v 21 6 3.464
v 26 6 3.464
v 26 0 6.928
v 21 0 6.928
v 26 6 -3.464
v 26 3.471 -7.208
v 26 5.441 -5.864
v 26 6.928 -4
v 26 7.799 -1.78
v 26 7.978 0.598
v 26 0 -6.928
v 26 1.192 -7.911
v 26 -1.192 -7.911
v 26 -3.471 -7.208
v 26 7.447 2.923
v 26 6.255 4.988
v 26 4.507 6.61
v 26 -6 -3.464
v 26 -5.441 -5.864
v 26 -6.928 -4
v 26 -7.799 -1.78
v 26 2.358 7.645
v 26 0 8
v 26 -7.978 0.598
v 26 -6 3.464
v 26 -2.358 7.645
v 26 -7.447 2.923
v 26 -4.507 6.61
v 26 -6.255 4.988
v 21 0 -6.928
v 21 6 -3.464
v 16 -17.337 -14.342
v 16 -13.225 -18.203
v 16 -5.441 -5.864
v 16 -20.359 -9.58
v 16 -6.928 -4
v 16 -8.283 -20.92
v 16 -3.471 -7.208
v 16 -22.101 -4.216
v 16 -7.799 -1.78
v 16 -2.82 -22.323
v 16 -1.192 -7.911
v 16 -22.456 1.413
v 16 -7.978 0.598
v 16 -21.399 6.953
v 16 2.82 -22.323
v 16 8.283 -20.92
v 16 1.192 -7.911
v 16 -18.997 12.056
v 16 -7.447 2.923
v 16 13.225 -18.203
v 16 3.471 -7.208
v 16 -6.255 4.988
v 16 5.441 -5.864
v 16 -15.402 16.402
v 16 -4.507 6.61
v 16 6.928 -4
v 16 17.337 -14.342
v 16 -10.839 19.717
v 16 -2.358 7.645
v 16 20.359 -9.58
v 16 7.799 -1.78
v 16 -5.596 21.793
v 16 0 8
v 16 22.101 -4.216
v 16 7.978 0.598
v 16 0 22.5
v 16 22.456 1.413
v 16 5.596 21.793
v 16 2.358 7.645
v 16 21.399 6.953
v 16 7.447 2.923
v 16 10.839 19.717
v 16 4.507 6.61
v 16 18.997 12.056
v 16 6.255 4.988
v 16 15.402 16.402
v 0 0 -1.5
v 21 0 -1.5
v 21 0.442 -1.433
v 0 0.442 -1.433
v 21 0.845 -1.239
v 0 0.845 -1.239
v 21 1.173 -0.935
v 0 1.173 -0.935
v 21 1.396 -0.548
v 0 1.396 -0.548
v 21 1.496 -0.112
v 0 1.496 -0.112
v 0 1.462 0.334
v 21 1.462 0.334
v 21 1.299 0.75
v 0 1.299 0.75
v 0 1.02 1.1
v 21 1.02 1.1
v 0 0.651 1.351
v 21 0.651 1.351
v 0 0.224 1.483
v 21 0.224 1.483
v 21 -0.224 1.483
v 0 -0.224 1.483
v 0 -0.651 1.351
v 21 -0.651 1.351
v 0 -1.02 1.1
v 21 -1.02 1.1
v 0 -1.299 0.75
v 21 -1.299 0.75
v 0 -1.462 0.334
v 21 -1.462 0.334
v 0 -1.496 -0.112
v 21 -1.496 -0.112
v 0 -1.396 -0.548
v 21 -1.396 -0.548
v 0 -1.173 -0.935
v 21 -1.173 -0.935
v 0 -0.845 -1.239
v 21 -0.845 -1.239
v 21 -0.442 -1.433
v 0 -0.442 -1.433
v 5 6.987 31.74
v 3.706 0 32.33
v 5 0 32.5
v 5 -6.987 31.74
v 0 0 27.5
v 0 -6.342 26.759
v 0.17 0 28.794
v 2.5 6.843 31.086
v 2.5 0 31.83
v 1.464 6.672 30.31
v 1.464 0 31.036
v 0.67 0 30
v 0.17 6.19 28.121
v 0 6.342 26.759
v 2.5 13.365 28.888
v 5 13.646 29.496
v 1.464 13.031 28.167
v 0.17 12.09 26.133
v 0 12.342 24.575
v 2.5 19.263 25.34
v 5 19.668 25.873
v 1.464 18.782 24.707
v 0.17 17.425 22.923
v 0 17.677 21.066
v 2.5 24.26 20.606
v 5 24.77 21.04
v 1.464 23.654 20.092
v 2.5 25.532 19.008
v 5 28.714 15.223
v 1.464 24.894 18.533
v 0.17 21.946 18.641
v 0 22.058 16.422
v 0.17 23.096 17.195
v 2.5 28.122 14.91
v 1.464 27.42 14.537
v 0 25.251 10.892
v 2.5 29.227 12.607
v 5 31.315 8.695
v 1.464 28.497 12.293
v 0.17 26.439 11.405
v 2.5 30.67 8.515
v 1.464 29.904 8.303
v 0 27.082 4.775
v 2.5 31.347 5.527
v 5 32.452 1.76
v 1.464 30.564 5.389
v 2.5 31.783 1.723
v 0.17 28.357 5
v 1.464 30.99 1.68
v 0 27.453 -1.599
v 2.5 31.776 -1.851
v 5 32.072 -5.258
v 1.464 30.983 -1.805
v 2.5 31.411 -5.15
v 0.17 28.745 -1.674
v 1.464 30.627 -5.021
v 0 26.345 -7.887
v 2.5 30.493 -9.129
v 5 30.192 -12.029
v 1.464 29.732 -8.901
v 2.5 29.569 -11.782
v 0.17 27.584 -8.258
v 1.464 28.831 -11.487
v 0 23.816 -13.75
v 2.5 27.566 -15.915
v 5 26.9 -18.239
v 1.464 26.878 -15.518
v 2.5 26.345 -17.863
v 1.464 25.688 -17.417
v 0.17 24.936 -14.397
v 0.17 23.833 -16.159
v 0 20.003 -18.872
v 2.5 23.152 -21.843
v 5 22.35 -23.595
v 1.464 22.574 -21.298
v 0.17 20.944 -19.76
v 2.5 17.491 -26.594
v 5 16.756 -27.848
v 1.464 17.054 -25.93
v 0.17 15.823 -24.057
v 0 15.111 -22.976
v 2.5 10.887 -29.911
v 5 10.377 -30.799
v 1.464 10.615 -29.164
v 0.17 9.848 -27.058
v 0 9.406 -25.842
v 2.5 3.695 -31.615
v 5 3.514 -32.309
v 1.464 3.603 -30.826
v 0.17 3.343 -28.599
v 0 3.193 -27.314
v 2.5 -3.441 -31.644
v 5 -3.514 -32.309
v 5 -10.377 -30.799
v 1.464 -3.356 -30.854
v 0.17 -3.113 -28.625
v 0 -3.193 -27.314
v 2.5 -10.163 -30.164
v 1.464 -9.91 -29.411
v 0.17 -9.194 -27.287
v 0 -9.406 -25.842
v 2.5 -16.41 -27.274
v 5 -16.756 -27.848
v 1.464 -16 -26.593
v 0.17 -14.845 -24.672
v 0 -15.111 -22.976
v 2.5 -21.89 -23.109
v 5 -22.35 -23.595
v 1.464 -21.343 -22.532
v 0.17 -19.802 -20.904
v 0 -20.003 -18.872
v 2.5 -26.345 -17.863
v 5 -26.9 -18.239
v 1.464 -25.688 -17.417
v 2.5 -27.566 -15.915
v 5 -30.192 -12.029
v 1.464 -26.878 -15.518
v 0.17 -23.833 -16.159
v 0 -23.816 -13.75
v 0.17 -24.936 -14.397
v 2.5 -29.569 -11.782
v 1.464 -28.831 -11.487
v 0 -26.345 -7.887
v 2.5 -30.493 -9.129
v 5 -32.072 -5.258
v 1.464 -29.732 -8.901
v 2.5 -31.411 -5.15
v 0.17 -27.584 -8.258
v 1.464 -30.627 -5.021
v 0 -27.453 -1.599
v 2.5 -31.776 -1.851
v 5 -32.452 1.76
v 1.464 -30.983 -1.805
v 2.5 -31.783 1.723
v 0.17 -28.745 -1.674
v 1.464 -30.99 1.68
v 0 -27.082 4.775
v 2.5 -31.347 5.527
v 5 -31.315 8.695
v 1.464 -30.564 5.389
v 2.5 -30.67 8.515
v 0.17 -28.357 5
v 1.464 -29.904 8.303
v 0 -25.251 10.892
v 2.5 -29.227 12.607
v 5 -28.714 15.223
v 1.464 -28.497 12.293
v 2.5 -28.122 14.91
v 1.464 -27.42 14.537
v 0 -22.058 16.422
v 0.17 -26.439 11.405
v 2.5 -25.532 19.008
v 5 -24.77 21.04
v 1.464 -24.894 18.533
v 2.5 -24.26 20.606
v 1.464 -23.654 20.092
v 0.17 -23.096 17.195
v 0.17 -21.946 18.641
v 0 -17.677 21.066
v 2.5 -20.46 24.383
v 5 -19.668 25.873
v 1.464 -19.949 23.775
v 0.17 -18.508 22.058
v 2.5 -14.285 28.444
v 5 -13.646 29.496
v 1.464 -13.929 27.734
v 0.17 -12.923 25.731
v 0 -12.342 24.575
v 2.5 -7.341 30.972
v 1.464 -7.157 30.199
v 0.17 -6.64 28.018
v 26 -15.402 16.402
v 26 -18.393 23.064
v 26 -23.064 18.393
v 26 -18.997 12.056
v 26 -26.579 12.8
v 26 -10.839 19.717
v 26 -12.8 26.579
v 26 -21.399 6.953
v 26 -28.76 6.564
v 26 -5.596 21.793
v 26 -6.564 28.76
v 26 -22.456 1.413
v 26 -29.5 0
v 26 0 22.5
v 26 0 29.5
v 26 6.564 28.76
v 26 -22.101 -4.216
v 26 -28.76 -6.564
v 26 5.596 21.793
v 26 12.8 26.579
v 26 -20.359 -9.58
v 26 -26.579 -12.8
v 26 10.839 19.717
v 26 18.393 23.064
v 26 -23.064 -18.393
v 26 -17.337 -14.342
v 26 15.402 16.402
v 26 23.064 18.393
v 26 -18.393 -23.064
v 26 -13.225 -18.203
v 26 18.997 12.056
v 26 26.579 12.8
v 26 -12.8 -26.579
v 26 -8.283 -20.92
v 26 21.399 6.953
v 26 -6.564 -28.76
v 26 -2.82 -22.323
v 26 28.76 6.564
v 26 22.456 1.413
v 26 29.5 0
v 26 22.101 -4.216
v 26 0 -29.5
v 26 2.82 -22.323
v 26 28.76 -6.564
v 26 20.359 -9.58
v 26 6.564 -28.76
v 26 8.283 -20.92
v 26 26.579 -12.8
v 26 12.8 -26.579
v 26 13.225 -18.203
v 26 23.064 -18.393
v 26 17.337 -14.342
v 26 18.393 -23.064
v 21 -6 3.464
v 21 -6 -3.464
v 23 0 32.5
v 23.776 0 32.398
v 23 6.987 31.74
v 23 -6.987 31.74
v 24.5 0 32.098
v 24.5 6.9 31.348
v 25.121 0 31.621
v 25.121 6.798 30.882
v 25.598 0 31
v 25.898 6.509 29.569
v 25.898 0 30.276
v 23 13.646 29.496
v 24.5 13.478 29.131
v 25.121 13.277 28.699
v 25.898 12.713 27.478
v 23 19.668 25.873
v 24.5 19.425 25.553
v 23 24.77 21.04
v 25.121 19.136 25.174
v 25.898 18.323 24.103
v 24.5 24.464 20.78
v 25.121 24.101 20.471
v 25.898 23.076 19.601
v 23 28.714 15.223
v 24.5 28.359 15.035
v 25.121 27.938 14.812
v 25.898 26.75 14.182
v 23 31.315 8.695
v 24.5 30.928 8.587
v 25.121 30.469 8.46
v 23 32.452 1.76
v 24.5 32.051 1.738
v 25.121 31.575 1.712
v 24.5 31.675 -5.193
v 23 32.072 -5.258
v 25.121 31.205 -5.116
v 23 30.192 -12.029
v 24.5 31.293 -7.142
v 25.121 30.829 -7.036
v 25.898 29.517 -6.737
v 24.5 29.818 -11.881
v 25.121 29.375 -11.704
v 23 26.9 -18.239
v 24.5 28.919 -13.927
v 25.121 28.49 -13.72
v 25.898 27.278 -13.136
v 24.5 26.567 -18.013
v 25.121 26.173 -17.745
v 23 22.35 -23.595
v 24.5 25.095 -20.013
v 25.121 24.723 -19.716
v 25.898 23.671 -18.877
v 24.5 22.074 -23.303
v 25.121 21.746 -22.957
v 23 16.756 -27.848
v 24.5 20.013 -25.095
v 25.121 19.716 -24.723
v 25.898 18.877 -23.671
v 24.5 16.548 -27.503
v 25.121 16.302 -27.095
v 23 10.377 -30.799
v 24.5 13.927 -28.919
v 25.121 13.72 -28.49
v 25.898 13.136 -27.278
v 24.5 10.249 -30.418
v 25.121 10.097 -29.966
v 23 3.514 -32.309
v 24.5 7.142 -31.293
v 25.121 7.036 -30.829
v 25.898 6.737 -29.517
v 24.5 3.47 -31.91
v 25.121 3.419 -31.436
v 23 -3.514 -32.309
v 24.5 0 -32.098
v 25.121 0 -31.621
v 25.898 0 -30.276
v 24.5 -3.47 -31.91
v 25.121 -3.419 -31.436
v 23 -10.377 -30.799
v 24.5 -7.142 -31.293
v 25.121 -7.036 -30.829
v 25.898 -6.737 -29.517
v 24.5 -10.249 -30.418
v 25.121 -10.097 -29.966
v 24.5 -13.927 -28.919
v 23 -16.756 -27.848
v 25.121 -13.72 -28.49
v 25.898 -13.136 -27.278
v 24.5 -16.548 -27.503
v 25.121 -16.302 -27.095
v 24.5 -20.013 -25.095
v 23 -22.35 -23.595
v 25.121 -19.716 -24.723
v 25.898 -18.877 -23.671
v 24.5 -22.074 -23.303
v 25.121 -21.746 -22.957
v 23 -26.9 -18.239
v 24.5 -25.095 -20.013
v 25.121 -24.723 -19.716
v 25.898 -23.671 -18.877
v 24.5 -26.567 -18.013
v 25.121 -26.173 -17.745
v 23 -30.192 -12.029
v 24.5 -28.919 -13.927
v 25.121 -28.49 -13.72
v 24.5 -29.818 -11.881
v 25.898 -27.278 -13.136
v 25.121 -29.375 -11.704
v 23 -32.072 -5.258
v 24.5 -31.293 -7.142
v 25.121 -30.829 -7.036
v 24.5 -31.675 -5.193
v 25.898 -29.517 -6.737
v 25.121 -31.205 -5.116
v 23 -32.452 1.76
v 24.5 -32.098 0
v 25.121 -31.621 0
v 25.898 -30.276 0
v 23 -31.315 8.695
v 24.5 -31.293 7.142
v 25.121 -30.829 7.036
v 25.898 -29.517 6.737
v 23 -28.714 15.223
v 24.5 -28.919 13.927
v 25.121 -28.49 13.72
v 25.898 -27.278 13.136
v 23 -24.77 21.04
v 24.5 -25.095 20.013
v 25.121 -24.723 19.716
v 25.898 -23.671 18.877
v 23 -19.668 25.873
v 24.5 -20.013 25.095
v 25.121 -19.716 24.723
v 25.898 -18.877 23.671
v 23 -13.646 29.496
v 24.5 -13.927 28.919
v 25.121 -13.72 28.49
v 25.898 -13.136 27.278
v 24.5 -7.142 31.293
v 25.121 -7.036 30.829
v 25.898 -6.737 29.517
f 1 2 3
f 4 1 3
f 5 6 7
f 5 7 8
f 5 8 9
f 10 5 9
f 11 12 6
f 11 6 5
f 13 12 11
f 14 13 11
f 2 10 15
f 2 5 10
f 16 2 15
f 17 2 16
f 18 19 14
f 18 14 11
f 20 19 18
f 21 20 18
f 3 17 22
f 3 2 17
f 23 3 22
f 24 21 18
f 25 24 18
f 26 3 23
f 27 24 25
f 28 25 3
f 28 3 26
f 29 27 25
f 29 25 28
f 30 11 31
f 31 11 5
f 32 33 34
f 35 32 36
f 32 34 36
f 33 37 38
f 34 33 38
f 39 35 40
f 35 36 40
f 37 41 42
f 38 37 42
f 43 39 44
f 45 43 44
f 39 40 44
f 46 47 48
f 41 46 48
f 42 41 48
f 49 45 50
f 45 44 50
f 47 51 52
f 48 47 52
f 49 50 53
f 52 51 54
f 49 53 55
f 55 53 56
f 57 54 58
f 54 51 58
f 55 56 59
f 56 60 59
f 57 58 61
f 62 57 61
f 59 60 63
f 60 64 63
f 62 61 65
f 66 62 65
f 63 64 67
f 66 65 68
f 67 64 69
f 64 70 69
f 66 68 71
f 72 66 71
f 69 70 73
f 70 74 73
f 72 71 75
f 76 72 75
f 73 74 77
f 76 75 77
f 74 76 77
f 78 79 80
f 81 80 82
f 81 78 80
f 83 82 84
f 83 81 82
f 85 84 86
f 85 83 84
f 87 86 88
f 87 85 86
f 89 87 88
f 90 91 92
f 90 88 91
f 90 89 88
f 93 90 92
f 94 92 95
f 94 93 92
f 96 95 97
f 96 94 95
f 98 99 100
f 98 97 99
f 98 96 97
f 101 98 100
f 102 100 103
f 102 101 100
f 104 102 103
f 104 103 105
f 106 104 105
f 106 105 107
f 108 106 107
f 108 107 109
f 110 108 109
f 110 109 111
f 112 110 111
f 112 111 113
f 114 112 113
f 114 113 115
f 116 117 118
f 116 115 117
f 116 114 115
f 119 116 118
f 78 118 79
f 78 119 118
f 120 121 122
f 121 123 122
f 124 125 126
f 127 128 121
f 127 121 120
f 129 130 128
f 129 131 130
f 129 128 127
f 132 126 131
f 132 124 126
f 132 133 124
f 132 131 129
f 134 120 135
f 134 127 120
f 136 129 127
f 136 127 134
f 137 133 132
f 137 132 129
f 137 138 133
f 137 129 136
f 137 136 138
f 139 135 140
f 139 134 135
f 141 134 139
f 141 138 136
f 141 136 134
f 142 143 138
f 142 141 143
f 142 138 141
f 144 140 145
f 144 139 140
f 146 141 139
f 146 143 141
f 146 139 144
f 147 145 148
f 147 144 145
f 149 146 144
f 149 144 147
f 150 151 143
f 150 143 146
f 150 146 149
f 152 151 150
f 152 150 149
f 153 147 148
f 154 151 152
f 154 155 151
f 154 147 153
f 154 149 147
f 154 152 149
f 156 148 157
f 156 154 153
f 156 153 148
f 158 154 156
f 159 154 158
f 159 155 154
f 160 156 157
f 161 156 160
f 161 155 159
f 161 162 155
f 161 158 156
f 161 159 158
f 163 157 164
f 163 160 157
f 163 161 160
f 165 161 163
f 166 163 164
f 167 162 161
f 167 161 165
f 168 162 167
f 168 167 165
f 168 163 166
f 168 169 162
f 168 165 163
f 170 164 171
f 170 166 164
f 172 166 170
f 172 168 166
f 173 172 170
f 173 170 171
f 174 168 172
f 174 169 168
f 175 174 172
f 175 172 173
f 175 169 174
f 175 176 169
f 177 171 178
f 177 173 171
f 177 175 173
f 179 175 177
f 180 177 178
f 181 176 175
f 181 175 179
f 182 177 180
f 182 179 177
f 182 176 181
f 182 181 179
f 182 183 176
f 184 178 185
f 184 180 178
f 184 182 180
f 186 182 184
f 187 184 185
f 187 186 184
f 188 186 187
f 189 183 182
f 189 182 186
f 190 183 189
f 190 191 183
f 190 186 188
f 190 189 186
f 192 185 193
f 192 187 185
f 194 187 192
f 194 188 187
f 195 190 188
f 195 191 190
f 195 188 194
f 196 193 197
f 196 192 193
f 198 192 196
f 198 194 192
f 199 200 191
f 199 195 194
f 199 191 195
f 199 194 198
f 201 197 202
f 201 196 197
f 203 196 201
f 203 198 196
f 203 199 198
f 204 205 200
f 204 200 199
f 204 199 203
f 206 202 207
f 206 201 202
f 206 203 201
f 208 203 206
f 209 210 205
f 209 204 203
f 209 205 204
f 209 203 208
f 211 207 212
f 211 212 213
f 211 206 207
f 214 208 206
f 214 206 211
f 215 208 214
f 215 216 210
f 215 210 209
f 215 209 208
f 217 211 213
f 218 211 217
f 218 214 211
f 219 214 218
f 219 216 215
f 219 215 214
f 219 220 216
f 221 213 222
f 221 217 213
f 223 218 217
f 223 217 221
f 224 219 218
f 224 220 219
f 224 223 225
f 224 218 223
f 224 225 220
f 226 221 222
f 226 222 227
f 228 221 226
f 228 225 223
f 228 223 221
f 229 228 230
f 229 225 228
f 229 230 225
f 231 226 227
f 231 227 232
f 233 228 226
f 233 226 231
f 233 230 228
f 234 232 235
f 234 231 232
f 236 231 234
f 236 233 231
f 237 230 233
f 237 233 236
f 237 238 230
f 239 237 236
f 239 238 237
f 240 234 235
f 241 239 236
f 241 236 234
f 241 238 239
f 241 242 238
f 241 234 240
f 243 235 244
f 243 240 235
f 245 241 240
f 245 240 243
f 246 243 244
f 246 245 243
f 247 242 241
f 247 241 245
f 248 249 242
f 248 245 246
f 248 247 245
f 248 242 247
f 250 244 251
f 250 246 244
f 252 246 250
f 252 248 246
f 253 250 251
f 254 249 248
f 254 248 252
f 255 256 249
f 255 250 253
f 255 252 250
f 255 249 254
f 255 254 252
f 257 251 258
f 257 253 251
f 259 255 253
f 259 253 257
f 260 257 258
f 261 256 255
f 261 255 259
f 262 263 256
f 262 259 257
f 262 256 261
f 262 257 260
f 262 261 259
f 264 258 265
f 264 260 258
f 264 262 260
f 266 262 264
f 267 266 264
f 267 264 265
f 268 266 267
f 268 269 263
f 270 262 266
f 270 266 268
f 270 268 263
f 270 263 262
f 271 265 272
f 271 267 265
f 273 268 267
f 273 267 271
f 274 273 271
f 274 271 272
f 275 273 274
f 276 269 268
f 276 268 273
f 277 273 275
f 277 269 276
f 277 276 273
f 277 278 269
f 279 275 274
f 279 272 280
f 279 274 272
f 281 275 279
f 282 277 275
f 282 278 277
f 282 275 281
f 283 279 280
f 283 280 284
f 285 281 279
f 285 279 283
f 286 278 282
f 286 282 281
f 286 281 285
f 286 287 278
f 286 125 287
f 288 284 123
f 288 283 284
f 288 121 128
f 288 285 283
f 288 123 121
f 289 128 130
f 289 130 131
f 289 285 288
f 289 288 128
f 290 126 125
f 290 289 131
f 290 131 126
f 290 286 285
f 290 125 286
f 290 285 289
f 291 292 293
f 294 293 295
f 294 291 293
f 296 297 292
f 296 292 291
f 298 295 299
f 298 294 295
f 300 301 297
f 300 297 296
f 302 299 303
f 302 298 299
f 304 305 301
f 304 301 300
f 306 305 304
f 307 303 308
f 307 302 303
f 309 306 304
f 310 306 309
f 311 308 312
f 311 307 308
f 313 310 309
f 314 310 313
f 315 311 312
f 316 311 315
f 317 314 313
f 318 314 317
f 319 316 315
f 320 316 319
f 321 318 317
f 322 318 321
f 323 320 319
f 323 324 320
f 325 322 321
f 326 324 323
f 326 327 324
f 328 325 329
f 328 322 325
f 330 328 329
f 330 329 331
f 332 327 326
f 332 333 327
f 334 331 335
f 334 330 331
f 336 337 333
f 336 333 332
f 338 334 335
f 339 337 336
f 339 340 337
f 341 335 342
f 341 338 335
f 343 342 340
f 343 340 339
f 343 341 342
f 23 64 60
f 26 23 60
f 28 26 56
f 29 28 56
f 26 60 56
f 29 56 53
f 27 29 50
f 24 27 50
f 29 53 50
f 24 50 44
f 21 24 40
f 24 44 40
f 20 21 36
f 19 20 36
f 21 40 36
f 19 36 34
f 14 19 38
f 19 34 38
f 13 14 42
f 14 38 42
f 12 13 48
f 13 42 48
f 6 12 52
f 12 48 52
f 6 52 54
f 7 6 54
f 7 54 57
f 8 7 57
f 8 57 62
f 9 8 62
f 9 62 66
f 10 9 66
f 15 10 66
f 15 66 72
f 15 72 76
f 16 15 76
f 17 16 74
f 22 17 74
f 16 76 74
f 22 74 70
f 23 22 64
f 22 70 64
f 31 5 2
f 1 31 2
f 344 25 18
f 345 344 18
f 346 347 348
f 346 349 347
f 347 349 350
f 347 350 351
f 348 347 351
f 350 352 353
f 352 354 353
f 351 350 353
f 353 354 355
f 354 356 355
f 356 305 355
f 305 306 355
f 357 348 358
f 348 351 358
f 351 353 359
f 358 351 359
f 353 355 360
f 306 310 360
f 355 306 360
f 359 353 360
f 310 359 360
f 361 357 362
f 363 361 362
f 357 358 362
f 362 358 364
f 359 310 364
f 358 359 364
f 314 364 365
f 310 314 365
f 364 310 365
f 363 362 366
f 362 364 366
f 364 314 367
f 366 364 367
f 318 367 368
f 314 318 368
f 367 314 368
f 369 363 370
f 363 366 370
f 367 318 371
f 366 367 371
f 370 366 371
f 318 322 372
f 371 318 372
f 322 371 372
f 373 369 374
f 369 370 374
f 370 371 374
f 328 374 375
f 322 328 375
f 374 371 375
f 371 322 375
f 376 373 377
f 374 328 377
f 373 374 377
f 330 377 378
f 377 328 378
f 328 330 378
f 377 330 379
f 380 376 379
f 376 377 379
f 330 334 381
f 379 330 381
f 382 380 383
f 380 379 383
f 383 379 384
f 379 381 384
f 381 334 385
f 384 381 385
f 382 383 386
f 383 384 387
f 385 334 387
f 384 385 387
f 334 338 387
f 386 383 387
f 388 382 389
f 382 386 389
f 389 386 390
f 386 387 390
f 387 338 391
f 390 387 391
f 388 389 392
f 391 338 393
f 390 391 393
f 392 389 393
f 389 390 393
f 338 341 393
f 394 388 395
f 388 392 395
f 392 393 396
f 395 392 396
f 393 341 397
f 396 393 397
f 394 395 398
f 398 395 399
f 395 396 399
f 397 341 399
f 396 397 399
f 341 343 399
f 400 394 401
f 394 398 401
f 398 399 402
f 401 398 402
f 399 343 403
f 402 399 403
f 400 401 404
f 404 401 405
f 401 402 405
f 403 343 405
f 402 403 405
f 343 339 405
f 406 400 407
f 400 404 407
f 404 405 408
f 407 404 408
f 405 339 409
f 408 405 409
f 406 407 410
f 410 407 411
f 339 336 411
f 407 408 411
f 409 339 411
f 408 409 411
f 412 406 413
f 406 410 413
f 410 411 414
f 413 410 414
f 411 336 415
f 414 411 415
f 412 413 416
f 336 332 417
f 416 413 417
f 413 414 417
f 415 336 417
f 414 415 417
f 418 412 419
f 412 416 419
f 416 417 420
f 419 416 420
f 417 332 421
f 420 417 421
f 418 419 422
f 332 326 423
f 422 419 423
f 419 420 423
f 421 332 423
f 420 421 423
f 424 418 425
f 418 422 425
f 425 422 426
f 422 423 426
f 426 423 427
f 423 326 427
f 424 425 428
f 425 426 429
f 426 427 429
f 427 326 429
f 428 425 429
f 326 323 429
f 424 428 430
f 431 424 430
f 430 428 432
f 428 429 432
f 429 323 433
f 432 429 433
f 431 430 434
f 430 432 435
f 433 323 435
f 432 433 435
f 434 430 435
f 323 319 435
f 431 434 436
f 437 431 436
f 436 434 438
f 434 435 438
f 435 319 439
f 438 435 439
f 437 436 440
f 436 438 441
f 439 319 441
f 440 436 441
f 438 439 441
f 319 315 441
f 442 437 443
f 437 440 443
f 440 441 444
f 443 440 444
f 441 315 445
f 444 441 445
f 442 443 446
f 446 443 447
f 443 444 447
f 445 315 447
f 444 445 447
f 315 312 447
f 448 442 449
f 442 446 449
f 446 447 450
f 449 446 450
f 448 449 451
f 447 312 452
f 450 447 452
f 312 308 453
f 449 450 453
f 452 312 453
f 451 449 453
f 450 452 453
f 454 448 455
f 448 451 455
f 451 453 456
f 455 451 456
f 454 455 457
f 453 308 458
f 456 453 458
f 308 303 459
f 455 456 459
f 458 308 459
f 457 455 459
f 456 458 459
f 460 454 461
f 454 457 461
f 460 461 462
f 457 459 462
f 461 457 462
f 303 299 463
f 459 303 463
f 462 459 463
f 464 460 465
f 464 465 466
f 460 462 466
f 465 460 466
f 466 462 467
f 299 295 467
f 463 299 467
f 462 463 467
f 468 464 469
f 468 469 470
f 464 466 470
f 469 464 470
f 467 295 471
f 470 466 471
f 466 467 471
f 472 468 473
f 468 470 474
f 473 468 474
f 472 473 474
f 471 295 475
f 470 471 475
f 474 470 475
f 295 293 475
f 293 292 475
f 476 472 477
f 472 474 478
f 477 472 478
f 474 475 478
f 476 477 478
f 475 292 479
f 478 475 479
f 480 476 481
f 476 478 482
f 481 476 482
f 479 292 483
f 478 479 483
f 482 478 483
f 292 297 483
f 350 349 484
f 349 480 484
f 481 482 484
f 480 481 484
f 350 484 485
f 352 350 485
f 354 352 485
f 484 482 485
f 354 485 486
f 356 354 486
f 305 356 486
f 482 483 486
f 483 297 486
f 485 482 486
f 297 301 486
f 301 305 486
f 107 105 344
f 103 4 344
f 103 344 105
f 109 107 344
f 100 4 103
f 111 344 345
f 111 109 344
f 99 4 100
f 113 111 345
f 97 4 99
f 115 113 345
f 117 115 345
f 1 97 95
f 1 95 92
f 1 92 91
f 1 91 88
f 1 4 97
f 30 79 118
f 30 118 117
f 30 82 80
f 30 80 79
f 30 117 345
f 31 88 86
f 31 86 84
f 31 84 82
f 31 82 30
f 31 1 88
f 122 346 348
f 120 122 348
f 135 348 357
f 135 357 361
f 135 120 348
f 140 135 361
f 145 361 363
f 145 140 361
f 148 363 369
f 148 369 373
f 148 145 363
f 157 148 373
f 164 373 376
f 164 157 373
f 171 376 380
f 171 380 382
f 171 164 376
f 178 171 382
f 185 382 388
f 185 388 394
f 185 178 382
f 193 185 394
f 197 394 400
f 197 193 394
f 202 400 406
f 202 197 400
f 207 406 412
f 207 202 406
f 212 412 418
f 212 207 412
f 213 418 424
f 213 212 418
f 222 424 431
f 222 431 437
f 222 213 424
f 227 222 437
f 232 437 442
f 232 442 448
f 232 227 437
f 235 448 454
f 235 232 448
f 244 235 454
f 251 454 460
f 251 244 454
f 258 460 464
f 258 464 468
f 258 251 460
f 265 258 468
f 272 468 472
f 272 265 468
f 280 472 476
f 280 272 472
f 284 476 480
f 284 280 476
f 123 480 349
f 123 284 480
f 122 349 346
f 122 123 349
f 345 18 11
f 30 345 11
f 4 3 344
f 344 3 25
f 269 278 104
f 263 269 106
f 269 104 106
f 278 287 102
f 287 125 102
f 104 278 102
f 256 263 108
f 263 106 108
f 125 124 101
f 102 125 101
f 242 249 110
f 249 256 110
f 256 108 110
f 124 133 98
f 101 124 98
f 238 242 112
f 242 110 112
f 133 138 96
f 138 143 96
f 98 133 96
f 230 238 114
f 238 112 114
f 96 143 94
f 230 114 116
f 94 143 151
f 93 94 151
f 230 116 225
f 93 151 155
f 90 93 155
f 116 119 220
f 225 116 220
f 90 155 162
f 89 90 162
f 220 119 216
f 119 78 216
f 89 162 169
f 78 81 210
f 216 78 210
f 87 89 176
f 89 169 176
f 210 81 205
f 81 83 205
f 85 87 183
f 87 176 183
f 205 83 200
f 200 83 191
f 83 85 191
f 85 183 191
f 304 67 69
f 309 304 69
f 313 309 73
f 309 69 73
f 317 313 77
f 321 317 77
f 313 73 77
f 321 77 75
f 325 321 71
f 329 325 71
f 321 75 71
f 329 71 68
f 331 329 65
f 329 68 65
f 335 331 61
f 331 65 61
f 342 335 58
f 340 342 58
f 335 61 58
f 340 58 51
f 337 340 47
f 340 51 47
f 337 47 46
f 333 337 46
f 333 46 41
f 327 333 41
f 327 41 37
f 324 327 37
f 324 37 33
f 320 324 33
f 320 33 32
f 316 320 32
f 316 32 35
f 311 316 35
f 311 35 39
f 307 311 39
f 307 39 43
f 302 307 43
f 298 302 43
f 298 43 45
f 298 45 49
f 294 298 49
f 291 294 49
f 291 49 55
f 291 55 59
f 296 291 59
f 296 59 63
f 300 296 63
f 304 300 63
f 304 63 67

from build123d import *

# Parameters (mm, degrees)
SKETCH_1_W              = 26
SKETCH_1_H              = 32.5
HOLE_WIZARD_M39_1_D     = 45
HOLE_WIZARD_M39_1_DEPTH = 10
SKETCH_4_R              = 8
EXTRUDE_1_DEPTH         = 10
CUT_EXTRUDE_1_DEPTH     = 5
SKETCH_6_R              = 1.5
CUT_EXTRUDE_2_DEPTH     = 53.80624963
FILLET_1_R              = 5
FILLET_2_R              = 3


with BuildPart() as part:
    # 草图1 → 旋转1 (revolve)
    with BuildSketch(Plane(origin=(0, 0, 0), x_dir=(-1, 0, 0), z_dir=(0, 0, -1)), mode=Mode.PRIVATE) as revolve_1_sk:
        with Locations((-13, 16.25)):
            Rectangle(SKETCH_1_W, SKETCH_1_H)
    revolve(revolve_1_sk.sketch.rotate(Axis((26, 0, 0), (-1, 0, 0)), 270), axis=Axis((26, 0, 0), (-1, 0, 0)))

    # M39 间隙孔1
    with Locations(Plane(origin=(26, 0, 0), x_dir=(0, 0, -1), z_dir=(1, 0, 0))):
        with Locations((0, 0)):
            Hole(HOLE_WIZARD_M39_1_D / 2, depth=HOLE_WIZARD_M39_1_DEPTH)

    # 草图4 → 凸台-拉伸1 (add)
    with BuildSketch(Plane(origin=(16, 0, 0), x_dir=(0, 0, -1), z_dir=(1, 0, 0))):
        with Locations(Location((0, 0, 0), (0, 0, 180))):
            Circle(SKETCH_4_R)
    extrude(amount=EXTRUDE_1_DEPTH)

    # 草图5 → 切除-拉伸1 (cut)
    with BuildSketch(Plane(origin=(26, 0, 0), x_dir=(0, 0, -1), z_dir=(1, 0, 0))):
        Polygon((3.464101615, -6), (6.92820323, 0), (3.464101615, 6), (-3.464101615, 6), (-6.92820323, 0), (-3.464101615, -6), align=None)
    extrude(amount=-CUT_EXTRUDE_1_DEPTH, mode=Mode.SUBTRACT)

    # 草图6 → 切除-拉伸2 (cut, through all)
    with BuildSketch(Plane(origin=(0, 0, 0), x_dir=(0, 0, -1), z_dir=(1, 0, 0))):
        Circle(SKETCH_6_R)
    extrude(amount=CUT_EXTRUDE_2_DEPTH, mode=Mode.SUBTRACT)

    # 圆角1
    fillet_1_edges = [part.edges().sort_by_distance(p)[0] for p in [
        (0, 0, -32.5),
    ]]
    fillet(fillet_1_edges, radius=FILLET_1_R)

    # 圆角2
    fillet_2_edges = [part.edges().sort_by_distance(p)[0] for p in [
        (26, 0, -32.5),
    ]]
    fillet(fillet_2_edges, radius=FILLET_2_R)


solid = part.part
